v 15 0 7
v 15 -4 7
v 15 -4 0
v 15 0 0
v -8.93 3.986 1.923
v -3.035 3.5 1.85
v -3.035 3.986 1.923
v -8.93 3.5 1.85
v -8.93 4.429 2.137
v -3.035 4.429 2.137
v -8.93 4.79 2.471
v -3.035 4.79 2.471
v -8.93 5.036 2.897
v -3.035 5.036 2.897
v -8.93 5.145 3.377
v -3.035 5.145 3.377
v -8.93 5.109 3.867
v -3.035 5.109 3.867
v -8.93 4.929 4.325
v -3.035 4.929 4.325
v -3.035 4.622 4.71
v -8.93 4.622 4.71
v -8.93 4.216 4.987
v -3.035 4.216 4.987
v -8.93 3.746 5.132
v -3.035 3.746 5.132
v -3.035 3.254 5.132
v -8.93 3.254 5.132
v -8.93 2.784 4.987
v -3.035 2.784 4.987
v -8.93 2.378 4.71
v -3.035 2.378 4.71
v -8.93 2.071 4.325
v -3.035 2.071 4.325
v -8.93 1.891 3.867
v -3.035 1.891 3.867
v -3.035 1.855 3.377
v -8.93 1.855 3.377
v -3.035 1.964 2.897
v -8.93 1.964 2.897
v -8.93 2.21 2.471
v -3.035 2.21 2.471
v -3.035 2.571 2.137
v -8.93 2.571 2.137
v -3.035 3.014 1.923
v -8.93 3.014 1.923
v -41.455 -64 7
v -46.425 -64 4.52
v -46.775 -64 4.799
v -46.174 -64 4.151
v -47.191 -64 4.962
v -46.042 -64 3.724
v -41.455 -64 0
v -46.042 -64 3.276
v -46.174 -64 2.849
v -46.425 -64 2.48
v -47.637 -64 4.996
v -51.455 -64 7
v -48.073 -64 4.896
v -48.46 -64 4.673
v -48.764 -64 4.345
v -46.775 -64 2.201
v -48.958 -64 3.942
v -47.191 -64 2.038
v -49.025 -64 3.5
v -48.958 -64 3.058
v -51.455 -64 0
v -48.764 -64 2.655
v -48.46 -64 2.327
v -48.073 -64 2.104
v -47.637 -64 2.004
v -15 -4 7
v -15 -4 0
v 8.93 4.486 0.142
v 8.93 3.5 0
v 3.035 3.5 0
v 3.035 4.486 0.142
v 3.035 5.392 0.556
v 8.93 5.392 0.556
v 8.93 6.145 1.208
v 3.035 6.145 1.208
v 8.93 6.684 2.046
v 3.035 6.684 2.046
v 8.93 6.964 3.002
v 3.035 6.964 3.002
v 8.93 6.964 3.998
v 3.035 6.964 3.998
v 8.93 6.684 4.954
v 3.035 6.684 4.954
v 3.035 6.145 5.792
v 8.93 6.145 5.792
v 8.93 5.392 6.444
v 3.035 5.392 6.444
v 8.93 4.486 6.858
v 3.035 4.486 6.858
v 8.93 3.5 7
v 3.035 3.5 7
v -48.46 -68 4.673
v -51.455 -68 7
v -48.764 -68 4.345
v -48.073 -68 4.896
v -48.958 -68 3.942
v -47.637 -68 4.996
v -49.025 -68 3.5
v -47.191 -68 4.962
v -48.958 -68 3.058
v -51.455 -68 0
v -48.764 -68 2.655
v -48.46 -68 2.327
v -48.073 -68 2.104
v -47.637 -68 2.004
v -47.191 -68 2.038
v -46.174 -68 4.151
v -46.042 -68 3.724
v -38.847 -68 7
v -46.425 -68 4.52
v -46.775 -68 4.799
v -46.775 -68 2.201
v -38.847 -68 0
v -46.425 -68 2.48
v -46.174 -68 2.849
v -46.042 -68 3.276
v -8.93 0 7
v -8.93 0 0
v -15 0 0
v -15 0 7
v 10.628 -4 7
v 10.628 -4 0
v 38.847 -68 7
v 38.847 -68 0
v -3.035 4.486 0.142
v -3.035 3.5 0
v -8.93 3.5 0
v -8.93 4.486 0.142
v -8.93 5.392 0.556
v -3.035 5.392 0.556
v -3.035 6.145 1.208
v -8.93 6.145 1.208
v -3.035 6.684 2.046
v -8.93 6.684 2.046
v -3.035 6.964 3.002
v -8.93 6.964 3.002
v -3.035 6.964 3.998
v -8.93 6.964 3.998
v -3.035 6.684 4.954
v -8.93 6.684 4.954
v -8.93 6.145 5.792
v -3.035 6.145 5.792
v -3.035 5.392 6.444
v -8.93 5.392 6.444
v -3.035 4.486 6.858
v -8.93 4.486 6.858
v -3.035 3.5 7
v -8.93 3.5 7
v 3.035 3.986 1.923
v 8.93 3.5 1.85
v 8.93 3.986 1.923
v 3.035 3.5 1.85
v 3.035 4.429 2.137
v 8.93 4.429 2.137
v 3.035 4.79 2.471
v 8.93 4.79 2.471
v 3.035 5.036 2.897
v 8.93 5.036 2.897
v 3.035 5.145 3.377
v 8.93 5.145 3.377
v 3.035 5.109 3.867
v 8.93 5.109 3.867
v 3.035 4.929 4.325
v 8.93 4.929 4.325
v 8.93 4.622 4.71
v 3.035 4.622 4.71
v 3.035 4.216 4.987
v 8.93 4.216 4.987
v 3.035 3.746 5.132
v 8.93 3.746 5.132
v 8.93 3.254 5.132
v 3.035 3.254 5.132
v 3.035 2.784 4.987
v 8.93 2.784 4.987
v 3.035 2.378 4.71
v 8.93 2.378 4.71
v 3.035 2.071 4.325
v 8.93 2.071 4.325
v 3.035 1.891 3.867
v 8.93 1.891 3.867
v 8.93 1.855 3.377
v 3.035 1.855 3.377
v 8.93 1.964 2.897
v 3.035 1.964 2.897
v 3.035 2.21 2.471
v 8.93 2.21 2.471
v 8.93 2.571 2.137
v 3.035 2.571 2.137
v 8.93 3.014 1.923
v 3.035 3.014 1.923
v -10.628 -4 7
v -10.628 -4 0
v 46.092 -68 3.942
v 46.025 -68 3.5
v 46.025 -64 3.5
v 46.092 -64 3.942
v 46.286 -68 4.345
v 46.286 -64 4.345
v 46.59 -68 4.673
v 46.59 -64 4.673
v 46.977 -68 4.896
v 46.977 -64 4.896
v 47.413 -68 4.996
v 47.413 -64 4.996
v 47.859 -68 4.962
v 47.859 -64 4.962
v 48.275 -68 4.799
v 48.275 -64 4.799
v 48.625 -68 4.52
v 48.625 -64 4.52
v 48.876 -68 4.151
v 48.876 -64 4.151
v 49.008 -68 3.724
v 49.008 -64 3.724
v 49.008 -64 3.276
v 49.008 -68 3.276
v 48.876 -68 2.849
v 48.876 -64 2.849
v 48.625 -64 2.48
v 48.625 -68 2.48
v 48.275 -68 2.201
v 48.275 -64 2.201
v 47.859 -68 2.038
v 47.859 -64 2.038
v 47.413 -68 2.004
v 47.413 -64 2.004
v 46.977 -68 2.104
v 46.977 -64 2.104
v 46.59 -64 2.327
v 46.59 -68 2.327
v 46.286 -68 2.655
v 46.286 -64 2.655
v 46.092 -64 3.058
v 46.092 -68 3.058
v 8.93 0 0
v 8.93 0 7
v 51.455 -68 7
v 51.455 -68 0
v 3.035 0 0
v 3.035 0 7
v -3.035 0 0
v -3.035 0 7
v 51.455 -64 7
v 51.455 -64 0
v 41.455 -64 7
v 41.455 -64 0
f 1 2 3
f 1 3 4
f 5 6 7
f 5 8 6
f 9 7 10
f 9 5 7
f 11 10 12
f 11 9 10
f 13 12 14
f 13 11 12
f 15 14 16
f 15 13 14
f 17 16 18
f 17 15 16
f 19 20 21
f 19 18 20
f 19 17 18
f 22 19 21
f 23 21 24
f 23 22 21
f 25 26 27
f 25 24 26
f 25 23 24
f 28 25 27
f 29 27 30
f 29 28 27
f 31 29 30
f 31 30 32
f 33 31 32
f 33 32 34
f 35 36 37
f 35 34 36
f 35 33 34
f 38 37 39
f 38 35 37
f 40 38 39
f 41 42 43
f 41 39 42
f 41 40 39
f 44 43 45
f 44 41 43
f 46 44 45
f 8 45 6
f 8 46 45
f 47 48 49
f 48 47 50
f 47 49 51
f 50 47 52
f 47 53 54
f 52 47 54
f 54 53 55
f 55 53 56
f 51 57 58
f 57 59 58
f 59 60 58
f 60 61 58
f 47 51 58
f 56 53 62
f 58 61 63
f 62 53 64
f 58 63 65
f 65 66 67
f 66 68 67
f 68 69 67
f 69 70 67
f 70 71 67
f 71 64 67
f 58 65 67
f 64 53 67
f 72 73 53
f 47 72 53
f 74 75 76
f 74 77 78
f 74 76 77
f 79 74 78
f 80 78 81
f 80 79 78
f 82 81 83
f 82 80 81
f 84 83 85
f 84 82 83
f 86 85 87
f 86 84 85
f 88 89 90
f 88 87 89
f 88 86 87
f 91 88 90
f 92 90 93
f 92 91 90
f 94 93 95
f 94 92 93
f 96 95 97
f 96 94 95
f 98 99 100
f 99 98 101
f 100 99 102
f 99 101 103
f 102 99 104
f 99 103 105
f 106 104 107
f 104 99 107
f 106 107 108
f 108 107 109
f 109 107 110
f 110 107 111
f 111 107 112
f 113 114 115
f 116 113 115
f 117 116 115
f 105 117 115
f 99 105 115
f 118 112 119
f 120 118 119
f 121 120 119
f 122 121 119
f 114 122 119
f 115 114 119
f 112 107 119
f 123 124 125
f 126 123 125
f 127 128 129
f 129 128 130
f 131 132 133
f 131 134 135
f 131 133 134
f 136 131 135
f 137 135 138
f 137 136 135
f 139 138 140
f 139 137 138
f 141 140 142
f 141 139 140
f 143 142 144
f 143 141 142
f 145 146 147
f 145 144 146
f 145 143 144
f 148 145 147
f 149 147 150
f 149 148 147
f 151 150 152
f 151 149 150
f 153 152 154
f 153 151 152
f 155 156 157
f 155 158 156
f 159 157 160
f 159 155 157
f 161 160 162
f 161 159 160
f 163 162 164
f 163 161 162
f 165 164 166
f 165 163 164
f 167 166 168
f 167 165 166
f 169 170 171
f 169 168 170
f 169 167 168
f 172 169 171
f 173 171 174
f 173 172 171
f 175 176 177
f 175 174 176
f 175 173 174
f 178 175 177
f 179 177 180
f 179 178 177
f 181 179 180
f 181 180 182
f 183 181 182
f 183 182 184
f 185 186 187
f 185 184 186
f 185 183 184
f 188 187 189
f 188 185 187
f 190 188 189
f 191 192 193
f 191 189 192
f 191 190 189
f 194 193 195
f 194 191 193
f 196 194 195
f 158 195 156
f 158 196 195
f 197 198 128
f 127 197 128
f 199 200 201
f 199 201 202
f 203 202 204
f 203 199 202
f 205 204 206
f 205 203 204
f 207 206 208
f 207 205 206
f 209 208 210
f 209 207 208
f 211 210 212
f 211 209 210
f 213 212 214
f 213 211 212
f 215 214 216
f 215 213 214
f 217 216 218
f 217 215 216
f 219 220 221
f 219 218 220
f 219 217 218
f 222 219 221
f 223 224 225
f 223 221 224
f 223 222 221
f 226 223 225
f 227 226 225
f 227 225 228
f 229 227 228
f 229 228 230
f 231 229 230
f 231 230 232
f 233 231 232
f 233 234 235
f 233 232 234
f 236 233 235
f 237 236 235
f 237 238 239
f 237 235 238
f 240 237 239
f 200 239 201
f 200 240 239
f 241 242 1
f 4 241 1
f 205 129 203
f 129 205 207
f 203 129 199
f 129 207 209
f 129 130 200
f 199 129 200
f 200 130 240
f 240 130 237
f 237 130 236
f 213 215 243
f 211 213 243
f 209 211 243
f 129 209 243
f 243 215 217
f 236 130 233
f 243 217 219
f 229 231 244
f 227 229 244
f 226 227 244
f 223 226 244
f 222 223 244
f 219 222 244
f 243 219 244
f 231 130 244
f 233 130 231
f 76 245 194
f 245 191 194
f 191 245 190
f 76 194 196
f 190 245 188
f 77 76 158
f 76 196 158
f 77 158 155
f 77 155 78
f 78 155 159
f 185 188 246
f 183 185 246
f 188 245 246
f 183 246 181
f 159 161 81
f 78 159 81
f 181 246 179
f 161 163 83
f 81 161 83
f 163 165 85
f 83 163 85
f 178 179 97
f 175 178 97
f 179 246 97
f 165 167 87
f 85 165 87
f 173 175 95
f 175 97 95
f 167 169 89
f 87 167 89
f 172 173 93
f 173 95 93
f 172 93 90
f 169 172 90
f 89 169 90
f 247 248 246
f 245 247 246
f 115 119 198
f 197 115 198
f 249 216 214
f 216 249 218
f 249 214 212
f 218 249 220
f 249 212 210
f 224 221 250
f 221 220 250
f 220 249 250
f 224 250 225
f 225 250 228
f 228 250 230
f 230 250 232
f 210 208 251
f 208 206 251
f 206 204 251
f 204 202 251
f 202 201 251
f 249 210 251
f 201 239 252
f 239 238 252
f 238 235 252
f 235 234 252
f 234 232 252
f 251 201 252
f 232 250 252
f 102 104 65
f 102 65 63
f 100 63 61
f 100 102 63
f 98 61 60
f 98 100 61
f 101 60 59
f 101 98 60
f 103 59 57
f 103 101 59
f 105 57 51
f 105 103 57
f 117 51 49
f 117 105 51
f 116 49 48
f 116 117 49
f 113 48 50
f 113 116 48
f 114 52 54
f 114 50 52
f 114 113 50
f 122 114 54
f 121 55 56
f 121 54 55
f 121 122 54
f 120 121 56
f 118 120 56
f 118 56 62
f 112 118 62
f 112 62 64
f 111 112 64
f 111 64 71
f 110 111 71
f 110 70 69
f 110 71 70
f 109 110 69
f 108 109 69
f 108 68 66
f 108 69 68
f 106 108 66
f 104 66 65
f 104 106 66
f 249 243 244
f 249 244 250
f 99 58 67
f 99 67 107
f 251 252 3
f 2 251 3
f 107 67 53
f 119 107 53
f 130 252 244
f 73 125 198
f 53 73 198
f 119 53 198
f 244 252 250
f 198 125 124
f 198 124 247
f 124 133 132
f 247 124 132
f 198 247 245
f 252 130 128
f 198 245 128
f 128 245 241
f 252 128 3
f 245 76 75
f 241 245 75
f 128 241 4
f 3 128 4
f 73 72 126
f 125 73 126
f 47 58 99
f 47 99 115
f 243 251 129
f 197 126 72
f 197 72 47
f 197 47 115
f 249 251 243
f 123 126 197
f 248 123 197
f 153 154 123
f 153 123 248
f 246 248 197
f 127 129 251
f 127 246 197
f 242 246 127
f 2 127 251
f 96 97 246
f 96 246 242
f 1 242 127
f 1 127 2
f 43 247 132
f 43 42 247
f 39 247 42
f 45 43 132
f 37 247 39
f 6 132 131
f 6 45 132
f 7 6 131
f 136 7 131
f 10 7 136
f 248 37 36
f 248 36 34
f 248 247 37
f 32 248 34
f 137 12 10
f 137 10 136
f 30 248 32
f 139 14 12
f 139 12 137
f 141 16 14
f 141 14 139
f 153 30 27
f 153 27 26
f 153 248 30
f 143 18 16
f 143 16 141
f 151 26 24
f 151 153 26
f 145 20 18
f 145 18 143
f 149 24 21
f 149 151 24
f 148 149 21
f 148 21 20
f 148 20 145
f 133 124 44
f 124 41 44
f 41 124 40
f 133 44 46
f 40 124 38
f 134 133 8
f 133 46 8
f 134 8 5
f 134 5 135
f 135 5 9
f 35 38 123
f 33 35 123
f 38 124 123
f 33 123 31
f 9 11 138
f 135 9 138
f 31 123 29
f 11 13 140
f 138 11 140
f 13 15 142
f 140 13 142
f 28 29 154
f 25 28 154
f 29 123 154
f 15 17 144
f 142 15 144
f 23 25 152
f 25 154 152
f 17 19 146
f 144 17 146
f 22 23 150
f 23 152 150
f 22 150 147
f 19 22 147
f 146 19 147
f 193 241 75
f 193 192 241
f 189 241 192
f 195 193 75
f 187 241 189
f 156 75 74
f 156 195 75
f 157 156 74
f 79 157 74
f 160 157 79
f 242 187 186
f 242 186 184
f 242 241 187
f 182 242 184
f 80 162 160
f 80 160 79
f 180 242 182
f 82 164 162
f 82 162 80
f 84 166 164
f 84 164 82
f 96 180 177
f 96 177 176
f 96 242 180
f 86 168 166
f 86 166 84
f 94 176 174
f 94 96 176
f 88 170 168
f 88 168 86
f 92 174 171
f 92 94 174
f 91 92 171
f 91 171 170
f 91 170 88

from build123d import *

# Parameters (mm, degrees)
SALIENTE_EXTRUIR3_DEPTH    = 7
CORTAR_EXTRUIR2_DEPTH      = 86.560604398
CORTAR_EXTRUIR2_DEPTH_BACK = 86.560604398
CROQUIS5_R                 = 1.5
CROQUIS6_R                 = 1.65
SALIENTE_EXTRUIR4_DEPTH    = 15
CROQUIS7_W                 = 6.07
CROQUIS7_H                 = 7
CORTAR_EXTRUIR3_DEPTH      = 86.560604398
CROQUIS8_W                 = 36.455
CROQUIS8_H                 = 4
CORTAR_EXTRUIR4_DEPTH      = 86.560604398


with BuildPart() as part:
    # Croquis4 → Saliente-Extruir3 (new body)
    with BuildSketch(Plane.XY):
        Polygon((-38.847108579, -68), (-10.628441913, -4), (-15, -4), (-41.455, -64), (-51.455, -64), (-51.455, -68), align=None)
        Polygon((0, -4), (0, 0), (-51.455, 0), (-51.455, -4), (-15, -4), (-10.628441913, -4), align=None)
        Polygon((51.455, -4), (51.455, 0), (0, 0), (0, -4), (10.628441913, -4), (15, -4), align=None)
        Polygon((41.455, -64), (15, -4), (10.628441913, -4), (38.847108579, -68), (51.455, -68), (51.455, -64), align=None)
    extrude(amount=SALIENTE_EXTRUIR3_DEPTH)

    # Croquis5 → Cortar-Extruir2 (cut, two sides: drawn at the far end of the back side and taken through both)
    with BuildSketch(Plane(origin=(0, 0, 0), x_dir=(1, 0, 0), z_dir=(0, 1, 0)).offset(-CORTAR_EXTRUIR2_DEPTH_BACK)):
        with Locations(Location((-47.525, -3.5, 0), (0, 0, 180))):
            Circle(CROQUIS5_R)
        with Locations(Location((47.525, -3.5, 0), (0, 0, 180))):
            Circle(CROQUIS5_R)
    extrude(amount=CORTAR_EXTRUIR2_DEPTH + CORTAR_EXTRUIR2_DEPTH_BACK, mode=Mode.SUBTRACT)

    # Croquis6 → Saliente-Extruir4 (add, symmetric)
    with BuildSketch(Plane(origin=(0, 0, 0), x_dir=(0, 0, -1), z_dir=(1, 0, 0))):
        with BuildLine():
            Line((-7, 0), (0, 0))
            Line((0, 0), (0, 3.5))
            ThreePointArc((0, 3.5), (-3.5, 7), (-7, 3.5))
            Line((-7, 3.5), (-7, 0))
        make_face()
        with Locations((-3.5, 3.5)):
            Circle(CROQUIS6_R, mode=Mode.SUBTRACT)
    extrude(amount=SALIENTE_EXTRUIR4_DEPTH, both=True)

    # Croquis7 → Cortar-Extruir3 (cut, through all)
    with BuildSketch(Plane.XY.offset(7)):
        with Locations((-11.965, 3.5)):
            Rectangle(CROQUIS7_W, CROQUIS7_H)
        with Locations((11.965, 3.5)):
            Rectangle(CROQUIS7_W, CROQUIS7_H)
        with Locations((0, 3.5)):
            Rectangle(CROQUIS7_W, CROQUIS7_H)
    extrude(amount=-CORTAR_EXTRUIR3_DEPTH, mode=Mode.SUBTRACT)

    # Croquis8 → Cortar-Extruir4 (cut, through all)
    with BuildSketch(Plane.XY.offset(7)):
        with Locations((-33.2275, -2)):
            Rectangle(CROQUIS8_W, CROQUIS8_H)
        with Locations((33.2275, -2)):
            Rectangle(CROQUIS8_W, CROQUIS8_H)
    extrude(amount=-CORTAR_EXTRUIR4_DEPTH, mode=Mode.SUBTRACT)


solid = part.part
